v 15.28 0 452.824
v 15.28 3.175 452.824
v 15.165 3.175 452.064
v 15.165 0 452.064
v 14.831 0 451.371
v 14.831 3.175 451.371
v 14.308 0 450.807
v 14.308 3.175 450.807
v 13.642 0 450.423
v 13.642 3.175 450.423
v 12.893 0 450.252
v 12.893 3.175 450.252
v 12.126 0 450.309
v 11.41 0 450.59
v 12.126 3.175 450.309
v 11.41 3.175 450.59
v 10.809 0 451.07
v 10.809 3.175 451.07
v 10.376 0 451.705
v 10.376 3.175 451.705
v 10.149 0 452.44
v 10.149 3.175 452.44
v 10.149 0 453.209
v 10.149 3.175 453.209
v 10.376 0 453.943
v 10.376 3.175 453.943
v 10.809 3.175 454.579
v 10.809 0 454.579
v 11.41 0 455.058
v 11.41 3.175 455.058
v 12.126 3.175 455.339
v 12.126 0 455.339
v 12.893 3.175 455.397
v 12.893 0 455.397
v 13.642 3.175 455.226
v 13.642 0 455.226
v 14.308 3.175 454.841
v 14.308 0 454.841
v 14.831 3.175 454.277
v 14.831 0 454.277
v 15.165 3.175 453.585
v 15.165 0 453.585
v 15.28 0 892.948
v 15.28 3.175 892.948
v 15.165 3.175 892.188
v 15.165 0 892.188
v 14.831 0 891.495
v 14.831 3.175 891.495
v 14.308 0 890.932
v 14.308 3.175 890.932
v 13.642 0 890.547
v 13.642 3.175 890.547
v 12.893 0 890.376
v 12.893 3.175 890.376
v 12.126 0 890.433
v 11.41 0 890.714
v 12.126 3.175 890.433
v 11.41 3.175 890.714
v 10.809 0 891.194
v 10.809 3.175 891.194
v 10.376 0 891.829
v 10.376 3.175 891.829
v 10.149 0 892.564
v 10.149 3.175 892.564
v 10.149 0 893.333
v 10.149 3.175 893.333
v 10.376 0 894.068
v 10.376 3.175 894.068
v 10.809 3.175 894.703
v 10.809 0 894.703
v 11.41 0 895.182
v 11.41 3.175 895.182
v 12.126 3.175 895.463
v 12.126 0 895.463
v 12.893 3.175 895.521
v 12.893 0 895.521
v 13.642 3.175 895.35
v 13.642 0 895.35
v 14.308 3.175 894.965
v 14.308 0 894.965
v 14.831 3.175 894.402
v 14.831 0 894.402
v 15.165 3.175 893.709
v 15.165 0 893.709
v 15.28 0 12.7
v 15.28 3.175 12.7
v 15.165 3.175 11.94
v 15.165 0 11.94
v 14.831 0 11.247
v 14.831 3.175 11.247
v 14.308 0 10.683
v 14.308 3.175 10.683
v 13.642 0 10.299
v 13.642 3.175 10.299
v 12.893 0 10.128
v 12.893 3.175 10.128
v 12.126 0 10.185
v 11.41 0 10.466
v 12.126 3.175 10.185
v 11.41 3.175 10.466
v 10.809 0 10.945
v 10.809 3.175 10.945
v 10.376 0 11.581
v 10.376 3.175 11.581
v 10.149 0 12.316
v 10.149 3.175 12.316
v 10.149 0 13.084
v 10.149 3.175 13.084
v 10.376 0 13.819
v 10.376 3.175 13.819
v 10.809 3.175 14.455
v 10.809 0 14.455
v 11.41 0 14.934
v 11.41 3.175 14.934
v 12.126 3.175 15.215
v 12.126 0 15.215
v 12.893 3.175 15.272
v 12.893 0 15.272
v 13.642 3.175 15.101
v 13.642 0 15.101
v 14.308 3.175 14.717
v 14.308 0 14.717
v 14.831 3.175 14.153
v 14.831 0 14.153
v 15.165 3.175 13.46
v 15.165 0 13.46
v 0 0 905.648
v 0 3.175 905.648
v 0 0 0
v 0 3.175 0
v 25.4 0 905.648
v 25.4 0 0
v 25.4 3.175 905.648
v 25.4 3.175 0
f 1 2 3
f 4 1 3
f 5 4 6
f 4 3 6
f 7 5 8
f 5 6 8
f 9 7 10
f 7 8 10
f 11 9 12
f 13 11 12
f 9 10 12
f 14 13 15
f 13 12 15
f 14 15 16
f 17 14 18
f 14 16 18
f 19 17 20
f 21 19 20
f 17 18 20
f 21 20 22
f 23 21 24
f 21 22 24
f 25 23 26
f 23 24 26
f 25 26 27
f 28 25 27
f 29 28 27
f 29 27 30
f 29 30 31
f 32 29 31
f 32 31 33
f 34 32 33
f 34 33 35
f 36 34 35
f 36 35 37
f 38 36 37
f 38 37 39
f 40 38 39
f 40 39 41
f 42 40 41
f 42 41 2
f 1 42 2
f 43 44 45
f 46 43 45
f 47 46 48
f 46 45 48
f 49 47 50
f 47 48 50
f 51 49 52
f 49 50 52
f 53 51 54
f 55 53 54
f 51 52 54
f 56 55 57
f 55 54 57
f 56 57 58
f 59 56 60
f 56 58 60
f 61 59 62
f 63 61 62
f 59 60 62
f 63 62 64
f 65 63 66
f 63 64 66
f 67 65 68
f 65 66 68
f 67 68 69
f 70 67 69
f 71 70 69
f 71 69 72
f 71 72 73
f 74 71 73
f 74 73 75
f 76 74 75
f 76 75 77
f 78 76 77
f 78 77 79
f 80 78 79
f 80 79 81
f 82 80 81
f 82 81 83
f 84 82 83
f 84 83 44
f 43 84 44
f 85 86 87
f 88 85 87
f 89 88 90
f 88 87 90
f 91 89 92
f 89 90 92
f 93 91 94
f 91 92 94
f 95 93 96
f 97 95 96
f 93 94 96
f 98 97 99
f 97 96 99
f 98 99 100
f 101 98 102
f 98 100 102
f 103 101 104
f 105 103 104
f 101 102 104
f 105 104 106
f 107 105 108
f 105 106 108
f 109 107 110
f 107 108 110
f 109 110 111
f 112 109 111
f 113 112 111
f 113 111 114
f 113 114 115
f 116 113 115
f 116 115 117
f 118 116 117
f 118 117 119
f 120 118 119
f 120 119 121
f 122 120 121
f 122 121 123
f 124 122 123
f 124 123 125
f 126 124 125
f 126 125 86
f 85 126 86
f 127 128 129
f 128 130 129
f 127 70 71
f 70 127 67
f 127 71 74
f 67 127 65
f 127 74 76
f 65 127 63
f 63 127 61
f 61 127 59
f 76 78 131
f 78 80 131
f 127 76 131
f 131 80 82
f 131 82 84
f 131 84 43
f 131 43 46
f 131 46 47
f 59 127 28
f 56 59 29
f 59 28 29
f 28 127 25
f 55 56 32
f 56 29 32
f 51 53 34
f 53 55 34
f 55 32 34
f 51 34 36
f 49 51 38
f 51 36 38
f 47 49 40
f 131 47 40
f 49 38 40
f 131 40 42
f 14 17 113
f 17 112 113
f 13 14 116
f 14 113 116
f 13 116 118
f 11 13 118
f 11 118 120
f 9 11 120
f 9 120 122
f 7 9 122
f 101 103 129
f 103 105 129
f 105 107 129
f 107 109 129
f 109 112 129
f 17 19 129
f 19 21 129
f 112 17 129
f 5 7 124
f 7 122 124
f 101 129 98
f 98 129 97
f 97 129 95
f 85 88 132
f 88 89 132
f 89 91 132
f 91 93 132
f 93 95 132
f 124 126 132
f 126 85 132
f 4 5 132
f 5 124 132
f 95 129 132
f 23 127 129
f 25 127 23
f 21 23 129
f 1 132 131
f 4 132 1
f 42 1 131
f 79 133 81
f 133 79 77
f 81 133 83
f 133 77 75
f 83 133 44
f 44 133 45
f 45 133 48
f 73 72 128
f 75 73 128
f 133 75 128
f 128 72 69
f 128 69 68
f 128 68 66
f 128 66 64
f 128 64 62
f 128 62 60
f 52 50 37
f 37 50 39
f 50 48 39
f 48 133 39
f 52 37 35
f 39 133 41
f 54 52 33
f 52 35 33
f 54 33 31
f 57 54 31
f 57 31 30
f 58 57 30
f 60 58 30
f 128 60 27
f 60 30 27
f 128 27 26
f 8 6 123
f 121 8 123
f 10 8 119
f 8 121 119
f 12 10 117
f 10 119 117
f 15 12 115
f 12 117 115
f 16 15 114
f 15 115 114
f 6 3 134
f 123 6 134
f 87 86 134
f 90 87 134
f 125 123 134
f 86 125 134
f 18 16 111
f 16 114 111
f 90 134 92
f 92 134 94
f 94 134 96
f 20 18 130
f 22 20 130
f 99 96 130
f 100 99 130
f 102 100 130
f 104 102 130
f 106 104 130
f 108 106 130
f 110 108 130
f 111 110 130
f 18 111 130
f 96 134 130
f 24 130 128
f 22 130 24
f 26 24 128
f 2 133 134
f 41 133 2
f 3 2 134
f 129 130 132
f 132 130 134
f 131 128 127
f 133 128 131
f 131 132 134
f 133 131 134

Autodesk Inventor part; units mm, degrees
ref_plane "YZ Plane" through (0, 0, 0) normal (1, 0, 0) x (0, 1, 0)
ref_plane "XZ Plane" through (0, 0, 0) normal (0, 1, 0) x (-1, 0, 0)
ref_plane "XY Plane" through (0, 0, 0) normal (0, 0, 1) x (1, 0, 0)
sketch "Sketch1" plane through (0, 0, 0) normal (0, 0, 1) x (1, 0, 0)
  line L0 (0, 0) -> (25.4, 0)
  line L1 (25.4, 0) -> (25.4, 3.175)
  line L2 (25.4, 3.175) -> (0, 3.175)
  line L3 (0, 3.175) -> (0, 0)
  dimension "d0" = 25.4
  dimension "d1" = 3.175
extrude "Extrusion1" add sketch "Sketch1" along normal blind 905.6484
sketch "Sketch2" plane through (0, 3.175, 0) normal (0, 1, 0) x (1, 0, 0)
  line L0 (0, 0) -> (25.4, 0) construction
  line L1 (12.7, 0) -> (12.7, -12.7) construction
  line L2 (0, -905.6484) -> (25.4, -905.6484) construction
  line L3 (12.7, -905.6484) -> (12.7, -892.9484) construction
  circle A0 centre (12.7, -892.9484) radius 2.5797
  circle A1 centre (12.7, -12.7) radius 2.5797
  circle A2 centre (12.7, -452.8242) radius 2.5797
  dimension "d4" = 12.7
  dimension "d5" = 12.7
  dimension "d6" = 5.1594
extrude "Extrusion2" cut sketch "Sketch2" against normal blind 905.6484
properties part number "Crossbeam"
